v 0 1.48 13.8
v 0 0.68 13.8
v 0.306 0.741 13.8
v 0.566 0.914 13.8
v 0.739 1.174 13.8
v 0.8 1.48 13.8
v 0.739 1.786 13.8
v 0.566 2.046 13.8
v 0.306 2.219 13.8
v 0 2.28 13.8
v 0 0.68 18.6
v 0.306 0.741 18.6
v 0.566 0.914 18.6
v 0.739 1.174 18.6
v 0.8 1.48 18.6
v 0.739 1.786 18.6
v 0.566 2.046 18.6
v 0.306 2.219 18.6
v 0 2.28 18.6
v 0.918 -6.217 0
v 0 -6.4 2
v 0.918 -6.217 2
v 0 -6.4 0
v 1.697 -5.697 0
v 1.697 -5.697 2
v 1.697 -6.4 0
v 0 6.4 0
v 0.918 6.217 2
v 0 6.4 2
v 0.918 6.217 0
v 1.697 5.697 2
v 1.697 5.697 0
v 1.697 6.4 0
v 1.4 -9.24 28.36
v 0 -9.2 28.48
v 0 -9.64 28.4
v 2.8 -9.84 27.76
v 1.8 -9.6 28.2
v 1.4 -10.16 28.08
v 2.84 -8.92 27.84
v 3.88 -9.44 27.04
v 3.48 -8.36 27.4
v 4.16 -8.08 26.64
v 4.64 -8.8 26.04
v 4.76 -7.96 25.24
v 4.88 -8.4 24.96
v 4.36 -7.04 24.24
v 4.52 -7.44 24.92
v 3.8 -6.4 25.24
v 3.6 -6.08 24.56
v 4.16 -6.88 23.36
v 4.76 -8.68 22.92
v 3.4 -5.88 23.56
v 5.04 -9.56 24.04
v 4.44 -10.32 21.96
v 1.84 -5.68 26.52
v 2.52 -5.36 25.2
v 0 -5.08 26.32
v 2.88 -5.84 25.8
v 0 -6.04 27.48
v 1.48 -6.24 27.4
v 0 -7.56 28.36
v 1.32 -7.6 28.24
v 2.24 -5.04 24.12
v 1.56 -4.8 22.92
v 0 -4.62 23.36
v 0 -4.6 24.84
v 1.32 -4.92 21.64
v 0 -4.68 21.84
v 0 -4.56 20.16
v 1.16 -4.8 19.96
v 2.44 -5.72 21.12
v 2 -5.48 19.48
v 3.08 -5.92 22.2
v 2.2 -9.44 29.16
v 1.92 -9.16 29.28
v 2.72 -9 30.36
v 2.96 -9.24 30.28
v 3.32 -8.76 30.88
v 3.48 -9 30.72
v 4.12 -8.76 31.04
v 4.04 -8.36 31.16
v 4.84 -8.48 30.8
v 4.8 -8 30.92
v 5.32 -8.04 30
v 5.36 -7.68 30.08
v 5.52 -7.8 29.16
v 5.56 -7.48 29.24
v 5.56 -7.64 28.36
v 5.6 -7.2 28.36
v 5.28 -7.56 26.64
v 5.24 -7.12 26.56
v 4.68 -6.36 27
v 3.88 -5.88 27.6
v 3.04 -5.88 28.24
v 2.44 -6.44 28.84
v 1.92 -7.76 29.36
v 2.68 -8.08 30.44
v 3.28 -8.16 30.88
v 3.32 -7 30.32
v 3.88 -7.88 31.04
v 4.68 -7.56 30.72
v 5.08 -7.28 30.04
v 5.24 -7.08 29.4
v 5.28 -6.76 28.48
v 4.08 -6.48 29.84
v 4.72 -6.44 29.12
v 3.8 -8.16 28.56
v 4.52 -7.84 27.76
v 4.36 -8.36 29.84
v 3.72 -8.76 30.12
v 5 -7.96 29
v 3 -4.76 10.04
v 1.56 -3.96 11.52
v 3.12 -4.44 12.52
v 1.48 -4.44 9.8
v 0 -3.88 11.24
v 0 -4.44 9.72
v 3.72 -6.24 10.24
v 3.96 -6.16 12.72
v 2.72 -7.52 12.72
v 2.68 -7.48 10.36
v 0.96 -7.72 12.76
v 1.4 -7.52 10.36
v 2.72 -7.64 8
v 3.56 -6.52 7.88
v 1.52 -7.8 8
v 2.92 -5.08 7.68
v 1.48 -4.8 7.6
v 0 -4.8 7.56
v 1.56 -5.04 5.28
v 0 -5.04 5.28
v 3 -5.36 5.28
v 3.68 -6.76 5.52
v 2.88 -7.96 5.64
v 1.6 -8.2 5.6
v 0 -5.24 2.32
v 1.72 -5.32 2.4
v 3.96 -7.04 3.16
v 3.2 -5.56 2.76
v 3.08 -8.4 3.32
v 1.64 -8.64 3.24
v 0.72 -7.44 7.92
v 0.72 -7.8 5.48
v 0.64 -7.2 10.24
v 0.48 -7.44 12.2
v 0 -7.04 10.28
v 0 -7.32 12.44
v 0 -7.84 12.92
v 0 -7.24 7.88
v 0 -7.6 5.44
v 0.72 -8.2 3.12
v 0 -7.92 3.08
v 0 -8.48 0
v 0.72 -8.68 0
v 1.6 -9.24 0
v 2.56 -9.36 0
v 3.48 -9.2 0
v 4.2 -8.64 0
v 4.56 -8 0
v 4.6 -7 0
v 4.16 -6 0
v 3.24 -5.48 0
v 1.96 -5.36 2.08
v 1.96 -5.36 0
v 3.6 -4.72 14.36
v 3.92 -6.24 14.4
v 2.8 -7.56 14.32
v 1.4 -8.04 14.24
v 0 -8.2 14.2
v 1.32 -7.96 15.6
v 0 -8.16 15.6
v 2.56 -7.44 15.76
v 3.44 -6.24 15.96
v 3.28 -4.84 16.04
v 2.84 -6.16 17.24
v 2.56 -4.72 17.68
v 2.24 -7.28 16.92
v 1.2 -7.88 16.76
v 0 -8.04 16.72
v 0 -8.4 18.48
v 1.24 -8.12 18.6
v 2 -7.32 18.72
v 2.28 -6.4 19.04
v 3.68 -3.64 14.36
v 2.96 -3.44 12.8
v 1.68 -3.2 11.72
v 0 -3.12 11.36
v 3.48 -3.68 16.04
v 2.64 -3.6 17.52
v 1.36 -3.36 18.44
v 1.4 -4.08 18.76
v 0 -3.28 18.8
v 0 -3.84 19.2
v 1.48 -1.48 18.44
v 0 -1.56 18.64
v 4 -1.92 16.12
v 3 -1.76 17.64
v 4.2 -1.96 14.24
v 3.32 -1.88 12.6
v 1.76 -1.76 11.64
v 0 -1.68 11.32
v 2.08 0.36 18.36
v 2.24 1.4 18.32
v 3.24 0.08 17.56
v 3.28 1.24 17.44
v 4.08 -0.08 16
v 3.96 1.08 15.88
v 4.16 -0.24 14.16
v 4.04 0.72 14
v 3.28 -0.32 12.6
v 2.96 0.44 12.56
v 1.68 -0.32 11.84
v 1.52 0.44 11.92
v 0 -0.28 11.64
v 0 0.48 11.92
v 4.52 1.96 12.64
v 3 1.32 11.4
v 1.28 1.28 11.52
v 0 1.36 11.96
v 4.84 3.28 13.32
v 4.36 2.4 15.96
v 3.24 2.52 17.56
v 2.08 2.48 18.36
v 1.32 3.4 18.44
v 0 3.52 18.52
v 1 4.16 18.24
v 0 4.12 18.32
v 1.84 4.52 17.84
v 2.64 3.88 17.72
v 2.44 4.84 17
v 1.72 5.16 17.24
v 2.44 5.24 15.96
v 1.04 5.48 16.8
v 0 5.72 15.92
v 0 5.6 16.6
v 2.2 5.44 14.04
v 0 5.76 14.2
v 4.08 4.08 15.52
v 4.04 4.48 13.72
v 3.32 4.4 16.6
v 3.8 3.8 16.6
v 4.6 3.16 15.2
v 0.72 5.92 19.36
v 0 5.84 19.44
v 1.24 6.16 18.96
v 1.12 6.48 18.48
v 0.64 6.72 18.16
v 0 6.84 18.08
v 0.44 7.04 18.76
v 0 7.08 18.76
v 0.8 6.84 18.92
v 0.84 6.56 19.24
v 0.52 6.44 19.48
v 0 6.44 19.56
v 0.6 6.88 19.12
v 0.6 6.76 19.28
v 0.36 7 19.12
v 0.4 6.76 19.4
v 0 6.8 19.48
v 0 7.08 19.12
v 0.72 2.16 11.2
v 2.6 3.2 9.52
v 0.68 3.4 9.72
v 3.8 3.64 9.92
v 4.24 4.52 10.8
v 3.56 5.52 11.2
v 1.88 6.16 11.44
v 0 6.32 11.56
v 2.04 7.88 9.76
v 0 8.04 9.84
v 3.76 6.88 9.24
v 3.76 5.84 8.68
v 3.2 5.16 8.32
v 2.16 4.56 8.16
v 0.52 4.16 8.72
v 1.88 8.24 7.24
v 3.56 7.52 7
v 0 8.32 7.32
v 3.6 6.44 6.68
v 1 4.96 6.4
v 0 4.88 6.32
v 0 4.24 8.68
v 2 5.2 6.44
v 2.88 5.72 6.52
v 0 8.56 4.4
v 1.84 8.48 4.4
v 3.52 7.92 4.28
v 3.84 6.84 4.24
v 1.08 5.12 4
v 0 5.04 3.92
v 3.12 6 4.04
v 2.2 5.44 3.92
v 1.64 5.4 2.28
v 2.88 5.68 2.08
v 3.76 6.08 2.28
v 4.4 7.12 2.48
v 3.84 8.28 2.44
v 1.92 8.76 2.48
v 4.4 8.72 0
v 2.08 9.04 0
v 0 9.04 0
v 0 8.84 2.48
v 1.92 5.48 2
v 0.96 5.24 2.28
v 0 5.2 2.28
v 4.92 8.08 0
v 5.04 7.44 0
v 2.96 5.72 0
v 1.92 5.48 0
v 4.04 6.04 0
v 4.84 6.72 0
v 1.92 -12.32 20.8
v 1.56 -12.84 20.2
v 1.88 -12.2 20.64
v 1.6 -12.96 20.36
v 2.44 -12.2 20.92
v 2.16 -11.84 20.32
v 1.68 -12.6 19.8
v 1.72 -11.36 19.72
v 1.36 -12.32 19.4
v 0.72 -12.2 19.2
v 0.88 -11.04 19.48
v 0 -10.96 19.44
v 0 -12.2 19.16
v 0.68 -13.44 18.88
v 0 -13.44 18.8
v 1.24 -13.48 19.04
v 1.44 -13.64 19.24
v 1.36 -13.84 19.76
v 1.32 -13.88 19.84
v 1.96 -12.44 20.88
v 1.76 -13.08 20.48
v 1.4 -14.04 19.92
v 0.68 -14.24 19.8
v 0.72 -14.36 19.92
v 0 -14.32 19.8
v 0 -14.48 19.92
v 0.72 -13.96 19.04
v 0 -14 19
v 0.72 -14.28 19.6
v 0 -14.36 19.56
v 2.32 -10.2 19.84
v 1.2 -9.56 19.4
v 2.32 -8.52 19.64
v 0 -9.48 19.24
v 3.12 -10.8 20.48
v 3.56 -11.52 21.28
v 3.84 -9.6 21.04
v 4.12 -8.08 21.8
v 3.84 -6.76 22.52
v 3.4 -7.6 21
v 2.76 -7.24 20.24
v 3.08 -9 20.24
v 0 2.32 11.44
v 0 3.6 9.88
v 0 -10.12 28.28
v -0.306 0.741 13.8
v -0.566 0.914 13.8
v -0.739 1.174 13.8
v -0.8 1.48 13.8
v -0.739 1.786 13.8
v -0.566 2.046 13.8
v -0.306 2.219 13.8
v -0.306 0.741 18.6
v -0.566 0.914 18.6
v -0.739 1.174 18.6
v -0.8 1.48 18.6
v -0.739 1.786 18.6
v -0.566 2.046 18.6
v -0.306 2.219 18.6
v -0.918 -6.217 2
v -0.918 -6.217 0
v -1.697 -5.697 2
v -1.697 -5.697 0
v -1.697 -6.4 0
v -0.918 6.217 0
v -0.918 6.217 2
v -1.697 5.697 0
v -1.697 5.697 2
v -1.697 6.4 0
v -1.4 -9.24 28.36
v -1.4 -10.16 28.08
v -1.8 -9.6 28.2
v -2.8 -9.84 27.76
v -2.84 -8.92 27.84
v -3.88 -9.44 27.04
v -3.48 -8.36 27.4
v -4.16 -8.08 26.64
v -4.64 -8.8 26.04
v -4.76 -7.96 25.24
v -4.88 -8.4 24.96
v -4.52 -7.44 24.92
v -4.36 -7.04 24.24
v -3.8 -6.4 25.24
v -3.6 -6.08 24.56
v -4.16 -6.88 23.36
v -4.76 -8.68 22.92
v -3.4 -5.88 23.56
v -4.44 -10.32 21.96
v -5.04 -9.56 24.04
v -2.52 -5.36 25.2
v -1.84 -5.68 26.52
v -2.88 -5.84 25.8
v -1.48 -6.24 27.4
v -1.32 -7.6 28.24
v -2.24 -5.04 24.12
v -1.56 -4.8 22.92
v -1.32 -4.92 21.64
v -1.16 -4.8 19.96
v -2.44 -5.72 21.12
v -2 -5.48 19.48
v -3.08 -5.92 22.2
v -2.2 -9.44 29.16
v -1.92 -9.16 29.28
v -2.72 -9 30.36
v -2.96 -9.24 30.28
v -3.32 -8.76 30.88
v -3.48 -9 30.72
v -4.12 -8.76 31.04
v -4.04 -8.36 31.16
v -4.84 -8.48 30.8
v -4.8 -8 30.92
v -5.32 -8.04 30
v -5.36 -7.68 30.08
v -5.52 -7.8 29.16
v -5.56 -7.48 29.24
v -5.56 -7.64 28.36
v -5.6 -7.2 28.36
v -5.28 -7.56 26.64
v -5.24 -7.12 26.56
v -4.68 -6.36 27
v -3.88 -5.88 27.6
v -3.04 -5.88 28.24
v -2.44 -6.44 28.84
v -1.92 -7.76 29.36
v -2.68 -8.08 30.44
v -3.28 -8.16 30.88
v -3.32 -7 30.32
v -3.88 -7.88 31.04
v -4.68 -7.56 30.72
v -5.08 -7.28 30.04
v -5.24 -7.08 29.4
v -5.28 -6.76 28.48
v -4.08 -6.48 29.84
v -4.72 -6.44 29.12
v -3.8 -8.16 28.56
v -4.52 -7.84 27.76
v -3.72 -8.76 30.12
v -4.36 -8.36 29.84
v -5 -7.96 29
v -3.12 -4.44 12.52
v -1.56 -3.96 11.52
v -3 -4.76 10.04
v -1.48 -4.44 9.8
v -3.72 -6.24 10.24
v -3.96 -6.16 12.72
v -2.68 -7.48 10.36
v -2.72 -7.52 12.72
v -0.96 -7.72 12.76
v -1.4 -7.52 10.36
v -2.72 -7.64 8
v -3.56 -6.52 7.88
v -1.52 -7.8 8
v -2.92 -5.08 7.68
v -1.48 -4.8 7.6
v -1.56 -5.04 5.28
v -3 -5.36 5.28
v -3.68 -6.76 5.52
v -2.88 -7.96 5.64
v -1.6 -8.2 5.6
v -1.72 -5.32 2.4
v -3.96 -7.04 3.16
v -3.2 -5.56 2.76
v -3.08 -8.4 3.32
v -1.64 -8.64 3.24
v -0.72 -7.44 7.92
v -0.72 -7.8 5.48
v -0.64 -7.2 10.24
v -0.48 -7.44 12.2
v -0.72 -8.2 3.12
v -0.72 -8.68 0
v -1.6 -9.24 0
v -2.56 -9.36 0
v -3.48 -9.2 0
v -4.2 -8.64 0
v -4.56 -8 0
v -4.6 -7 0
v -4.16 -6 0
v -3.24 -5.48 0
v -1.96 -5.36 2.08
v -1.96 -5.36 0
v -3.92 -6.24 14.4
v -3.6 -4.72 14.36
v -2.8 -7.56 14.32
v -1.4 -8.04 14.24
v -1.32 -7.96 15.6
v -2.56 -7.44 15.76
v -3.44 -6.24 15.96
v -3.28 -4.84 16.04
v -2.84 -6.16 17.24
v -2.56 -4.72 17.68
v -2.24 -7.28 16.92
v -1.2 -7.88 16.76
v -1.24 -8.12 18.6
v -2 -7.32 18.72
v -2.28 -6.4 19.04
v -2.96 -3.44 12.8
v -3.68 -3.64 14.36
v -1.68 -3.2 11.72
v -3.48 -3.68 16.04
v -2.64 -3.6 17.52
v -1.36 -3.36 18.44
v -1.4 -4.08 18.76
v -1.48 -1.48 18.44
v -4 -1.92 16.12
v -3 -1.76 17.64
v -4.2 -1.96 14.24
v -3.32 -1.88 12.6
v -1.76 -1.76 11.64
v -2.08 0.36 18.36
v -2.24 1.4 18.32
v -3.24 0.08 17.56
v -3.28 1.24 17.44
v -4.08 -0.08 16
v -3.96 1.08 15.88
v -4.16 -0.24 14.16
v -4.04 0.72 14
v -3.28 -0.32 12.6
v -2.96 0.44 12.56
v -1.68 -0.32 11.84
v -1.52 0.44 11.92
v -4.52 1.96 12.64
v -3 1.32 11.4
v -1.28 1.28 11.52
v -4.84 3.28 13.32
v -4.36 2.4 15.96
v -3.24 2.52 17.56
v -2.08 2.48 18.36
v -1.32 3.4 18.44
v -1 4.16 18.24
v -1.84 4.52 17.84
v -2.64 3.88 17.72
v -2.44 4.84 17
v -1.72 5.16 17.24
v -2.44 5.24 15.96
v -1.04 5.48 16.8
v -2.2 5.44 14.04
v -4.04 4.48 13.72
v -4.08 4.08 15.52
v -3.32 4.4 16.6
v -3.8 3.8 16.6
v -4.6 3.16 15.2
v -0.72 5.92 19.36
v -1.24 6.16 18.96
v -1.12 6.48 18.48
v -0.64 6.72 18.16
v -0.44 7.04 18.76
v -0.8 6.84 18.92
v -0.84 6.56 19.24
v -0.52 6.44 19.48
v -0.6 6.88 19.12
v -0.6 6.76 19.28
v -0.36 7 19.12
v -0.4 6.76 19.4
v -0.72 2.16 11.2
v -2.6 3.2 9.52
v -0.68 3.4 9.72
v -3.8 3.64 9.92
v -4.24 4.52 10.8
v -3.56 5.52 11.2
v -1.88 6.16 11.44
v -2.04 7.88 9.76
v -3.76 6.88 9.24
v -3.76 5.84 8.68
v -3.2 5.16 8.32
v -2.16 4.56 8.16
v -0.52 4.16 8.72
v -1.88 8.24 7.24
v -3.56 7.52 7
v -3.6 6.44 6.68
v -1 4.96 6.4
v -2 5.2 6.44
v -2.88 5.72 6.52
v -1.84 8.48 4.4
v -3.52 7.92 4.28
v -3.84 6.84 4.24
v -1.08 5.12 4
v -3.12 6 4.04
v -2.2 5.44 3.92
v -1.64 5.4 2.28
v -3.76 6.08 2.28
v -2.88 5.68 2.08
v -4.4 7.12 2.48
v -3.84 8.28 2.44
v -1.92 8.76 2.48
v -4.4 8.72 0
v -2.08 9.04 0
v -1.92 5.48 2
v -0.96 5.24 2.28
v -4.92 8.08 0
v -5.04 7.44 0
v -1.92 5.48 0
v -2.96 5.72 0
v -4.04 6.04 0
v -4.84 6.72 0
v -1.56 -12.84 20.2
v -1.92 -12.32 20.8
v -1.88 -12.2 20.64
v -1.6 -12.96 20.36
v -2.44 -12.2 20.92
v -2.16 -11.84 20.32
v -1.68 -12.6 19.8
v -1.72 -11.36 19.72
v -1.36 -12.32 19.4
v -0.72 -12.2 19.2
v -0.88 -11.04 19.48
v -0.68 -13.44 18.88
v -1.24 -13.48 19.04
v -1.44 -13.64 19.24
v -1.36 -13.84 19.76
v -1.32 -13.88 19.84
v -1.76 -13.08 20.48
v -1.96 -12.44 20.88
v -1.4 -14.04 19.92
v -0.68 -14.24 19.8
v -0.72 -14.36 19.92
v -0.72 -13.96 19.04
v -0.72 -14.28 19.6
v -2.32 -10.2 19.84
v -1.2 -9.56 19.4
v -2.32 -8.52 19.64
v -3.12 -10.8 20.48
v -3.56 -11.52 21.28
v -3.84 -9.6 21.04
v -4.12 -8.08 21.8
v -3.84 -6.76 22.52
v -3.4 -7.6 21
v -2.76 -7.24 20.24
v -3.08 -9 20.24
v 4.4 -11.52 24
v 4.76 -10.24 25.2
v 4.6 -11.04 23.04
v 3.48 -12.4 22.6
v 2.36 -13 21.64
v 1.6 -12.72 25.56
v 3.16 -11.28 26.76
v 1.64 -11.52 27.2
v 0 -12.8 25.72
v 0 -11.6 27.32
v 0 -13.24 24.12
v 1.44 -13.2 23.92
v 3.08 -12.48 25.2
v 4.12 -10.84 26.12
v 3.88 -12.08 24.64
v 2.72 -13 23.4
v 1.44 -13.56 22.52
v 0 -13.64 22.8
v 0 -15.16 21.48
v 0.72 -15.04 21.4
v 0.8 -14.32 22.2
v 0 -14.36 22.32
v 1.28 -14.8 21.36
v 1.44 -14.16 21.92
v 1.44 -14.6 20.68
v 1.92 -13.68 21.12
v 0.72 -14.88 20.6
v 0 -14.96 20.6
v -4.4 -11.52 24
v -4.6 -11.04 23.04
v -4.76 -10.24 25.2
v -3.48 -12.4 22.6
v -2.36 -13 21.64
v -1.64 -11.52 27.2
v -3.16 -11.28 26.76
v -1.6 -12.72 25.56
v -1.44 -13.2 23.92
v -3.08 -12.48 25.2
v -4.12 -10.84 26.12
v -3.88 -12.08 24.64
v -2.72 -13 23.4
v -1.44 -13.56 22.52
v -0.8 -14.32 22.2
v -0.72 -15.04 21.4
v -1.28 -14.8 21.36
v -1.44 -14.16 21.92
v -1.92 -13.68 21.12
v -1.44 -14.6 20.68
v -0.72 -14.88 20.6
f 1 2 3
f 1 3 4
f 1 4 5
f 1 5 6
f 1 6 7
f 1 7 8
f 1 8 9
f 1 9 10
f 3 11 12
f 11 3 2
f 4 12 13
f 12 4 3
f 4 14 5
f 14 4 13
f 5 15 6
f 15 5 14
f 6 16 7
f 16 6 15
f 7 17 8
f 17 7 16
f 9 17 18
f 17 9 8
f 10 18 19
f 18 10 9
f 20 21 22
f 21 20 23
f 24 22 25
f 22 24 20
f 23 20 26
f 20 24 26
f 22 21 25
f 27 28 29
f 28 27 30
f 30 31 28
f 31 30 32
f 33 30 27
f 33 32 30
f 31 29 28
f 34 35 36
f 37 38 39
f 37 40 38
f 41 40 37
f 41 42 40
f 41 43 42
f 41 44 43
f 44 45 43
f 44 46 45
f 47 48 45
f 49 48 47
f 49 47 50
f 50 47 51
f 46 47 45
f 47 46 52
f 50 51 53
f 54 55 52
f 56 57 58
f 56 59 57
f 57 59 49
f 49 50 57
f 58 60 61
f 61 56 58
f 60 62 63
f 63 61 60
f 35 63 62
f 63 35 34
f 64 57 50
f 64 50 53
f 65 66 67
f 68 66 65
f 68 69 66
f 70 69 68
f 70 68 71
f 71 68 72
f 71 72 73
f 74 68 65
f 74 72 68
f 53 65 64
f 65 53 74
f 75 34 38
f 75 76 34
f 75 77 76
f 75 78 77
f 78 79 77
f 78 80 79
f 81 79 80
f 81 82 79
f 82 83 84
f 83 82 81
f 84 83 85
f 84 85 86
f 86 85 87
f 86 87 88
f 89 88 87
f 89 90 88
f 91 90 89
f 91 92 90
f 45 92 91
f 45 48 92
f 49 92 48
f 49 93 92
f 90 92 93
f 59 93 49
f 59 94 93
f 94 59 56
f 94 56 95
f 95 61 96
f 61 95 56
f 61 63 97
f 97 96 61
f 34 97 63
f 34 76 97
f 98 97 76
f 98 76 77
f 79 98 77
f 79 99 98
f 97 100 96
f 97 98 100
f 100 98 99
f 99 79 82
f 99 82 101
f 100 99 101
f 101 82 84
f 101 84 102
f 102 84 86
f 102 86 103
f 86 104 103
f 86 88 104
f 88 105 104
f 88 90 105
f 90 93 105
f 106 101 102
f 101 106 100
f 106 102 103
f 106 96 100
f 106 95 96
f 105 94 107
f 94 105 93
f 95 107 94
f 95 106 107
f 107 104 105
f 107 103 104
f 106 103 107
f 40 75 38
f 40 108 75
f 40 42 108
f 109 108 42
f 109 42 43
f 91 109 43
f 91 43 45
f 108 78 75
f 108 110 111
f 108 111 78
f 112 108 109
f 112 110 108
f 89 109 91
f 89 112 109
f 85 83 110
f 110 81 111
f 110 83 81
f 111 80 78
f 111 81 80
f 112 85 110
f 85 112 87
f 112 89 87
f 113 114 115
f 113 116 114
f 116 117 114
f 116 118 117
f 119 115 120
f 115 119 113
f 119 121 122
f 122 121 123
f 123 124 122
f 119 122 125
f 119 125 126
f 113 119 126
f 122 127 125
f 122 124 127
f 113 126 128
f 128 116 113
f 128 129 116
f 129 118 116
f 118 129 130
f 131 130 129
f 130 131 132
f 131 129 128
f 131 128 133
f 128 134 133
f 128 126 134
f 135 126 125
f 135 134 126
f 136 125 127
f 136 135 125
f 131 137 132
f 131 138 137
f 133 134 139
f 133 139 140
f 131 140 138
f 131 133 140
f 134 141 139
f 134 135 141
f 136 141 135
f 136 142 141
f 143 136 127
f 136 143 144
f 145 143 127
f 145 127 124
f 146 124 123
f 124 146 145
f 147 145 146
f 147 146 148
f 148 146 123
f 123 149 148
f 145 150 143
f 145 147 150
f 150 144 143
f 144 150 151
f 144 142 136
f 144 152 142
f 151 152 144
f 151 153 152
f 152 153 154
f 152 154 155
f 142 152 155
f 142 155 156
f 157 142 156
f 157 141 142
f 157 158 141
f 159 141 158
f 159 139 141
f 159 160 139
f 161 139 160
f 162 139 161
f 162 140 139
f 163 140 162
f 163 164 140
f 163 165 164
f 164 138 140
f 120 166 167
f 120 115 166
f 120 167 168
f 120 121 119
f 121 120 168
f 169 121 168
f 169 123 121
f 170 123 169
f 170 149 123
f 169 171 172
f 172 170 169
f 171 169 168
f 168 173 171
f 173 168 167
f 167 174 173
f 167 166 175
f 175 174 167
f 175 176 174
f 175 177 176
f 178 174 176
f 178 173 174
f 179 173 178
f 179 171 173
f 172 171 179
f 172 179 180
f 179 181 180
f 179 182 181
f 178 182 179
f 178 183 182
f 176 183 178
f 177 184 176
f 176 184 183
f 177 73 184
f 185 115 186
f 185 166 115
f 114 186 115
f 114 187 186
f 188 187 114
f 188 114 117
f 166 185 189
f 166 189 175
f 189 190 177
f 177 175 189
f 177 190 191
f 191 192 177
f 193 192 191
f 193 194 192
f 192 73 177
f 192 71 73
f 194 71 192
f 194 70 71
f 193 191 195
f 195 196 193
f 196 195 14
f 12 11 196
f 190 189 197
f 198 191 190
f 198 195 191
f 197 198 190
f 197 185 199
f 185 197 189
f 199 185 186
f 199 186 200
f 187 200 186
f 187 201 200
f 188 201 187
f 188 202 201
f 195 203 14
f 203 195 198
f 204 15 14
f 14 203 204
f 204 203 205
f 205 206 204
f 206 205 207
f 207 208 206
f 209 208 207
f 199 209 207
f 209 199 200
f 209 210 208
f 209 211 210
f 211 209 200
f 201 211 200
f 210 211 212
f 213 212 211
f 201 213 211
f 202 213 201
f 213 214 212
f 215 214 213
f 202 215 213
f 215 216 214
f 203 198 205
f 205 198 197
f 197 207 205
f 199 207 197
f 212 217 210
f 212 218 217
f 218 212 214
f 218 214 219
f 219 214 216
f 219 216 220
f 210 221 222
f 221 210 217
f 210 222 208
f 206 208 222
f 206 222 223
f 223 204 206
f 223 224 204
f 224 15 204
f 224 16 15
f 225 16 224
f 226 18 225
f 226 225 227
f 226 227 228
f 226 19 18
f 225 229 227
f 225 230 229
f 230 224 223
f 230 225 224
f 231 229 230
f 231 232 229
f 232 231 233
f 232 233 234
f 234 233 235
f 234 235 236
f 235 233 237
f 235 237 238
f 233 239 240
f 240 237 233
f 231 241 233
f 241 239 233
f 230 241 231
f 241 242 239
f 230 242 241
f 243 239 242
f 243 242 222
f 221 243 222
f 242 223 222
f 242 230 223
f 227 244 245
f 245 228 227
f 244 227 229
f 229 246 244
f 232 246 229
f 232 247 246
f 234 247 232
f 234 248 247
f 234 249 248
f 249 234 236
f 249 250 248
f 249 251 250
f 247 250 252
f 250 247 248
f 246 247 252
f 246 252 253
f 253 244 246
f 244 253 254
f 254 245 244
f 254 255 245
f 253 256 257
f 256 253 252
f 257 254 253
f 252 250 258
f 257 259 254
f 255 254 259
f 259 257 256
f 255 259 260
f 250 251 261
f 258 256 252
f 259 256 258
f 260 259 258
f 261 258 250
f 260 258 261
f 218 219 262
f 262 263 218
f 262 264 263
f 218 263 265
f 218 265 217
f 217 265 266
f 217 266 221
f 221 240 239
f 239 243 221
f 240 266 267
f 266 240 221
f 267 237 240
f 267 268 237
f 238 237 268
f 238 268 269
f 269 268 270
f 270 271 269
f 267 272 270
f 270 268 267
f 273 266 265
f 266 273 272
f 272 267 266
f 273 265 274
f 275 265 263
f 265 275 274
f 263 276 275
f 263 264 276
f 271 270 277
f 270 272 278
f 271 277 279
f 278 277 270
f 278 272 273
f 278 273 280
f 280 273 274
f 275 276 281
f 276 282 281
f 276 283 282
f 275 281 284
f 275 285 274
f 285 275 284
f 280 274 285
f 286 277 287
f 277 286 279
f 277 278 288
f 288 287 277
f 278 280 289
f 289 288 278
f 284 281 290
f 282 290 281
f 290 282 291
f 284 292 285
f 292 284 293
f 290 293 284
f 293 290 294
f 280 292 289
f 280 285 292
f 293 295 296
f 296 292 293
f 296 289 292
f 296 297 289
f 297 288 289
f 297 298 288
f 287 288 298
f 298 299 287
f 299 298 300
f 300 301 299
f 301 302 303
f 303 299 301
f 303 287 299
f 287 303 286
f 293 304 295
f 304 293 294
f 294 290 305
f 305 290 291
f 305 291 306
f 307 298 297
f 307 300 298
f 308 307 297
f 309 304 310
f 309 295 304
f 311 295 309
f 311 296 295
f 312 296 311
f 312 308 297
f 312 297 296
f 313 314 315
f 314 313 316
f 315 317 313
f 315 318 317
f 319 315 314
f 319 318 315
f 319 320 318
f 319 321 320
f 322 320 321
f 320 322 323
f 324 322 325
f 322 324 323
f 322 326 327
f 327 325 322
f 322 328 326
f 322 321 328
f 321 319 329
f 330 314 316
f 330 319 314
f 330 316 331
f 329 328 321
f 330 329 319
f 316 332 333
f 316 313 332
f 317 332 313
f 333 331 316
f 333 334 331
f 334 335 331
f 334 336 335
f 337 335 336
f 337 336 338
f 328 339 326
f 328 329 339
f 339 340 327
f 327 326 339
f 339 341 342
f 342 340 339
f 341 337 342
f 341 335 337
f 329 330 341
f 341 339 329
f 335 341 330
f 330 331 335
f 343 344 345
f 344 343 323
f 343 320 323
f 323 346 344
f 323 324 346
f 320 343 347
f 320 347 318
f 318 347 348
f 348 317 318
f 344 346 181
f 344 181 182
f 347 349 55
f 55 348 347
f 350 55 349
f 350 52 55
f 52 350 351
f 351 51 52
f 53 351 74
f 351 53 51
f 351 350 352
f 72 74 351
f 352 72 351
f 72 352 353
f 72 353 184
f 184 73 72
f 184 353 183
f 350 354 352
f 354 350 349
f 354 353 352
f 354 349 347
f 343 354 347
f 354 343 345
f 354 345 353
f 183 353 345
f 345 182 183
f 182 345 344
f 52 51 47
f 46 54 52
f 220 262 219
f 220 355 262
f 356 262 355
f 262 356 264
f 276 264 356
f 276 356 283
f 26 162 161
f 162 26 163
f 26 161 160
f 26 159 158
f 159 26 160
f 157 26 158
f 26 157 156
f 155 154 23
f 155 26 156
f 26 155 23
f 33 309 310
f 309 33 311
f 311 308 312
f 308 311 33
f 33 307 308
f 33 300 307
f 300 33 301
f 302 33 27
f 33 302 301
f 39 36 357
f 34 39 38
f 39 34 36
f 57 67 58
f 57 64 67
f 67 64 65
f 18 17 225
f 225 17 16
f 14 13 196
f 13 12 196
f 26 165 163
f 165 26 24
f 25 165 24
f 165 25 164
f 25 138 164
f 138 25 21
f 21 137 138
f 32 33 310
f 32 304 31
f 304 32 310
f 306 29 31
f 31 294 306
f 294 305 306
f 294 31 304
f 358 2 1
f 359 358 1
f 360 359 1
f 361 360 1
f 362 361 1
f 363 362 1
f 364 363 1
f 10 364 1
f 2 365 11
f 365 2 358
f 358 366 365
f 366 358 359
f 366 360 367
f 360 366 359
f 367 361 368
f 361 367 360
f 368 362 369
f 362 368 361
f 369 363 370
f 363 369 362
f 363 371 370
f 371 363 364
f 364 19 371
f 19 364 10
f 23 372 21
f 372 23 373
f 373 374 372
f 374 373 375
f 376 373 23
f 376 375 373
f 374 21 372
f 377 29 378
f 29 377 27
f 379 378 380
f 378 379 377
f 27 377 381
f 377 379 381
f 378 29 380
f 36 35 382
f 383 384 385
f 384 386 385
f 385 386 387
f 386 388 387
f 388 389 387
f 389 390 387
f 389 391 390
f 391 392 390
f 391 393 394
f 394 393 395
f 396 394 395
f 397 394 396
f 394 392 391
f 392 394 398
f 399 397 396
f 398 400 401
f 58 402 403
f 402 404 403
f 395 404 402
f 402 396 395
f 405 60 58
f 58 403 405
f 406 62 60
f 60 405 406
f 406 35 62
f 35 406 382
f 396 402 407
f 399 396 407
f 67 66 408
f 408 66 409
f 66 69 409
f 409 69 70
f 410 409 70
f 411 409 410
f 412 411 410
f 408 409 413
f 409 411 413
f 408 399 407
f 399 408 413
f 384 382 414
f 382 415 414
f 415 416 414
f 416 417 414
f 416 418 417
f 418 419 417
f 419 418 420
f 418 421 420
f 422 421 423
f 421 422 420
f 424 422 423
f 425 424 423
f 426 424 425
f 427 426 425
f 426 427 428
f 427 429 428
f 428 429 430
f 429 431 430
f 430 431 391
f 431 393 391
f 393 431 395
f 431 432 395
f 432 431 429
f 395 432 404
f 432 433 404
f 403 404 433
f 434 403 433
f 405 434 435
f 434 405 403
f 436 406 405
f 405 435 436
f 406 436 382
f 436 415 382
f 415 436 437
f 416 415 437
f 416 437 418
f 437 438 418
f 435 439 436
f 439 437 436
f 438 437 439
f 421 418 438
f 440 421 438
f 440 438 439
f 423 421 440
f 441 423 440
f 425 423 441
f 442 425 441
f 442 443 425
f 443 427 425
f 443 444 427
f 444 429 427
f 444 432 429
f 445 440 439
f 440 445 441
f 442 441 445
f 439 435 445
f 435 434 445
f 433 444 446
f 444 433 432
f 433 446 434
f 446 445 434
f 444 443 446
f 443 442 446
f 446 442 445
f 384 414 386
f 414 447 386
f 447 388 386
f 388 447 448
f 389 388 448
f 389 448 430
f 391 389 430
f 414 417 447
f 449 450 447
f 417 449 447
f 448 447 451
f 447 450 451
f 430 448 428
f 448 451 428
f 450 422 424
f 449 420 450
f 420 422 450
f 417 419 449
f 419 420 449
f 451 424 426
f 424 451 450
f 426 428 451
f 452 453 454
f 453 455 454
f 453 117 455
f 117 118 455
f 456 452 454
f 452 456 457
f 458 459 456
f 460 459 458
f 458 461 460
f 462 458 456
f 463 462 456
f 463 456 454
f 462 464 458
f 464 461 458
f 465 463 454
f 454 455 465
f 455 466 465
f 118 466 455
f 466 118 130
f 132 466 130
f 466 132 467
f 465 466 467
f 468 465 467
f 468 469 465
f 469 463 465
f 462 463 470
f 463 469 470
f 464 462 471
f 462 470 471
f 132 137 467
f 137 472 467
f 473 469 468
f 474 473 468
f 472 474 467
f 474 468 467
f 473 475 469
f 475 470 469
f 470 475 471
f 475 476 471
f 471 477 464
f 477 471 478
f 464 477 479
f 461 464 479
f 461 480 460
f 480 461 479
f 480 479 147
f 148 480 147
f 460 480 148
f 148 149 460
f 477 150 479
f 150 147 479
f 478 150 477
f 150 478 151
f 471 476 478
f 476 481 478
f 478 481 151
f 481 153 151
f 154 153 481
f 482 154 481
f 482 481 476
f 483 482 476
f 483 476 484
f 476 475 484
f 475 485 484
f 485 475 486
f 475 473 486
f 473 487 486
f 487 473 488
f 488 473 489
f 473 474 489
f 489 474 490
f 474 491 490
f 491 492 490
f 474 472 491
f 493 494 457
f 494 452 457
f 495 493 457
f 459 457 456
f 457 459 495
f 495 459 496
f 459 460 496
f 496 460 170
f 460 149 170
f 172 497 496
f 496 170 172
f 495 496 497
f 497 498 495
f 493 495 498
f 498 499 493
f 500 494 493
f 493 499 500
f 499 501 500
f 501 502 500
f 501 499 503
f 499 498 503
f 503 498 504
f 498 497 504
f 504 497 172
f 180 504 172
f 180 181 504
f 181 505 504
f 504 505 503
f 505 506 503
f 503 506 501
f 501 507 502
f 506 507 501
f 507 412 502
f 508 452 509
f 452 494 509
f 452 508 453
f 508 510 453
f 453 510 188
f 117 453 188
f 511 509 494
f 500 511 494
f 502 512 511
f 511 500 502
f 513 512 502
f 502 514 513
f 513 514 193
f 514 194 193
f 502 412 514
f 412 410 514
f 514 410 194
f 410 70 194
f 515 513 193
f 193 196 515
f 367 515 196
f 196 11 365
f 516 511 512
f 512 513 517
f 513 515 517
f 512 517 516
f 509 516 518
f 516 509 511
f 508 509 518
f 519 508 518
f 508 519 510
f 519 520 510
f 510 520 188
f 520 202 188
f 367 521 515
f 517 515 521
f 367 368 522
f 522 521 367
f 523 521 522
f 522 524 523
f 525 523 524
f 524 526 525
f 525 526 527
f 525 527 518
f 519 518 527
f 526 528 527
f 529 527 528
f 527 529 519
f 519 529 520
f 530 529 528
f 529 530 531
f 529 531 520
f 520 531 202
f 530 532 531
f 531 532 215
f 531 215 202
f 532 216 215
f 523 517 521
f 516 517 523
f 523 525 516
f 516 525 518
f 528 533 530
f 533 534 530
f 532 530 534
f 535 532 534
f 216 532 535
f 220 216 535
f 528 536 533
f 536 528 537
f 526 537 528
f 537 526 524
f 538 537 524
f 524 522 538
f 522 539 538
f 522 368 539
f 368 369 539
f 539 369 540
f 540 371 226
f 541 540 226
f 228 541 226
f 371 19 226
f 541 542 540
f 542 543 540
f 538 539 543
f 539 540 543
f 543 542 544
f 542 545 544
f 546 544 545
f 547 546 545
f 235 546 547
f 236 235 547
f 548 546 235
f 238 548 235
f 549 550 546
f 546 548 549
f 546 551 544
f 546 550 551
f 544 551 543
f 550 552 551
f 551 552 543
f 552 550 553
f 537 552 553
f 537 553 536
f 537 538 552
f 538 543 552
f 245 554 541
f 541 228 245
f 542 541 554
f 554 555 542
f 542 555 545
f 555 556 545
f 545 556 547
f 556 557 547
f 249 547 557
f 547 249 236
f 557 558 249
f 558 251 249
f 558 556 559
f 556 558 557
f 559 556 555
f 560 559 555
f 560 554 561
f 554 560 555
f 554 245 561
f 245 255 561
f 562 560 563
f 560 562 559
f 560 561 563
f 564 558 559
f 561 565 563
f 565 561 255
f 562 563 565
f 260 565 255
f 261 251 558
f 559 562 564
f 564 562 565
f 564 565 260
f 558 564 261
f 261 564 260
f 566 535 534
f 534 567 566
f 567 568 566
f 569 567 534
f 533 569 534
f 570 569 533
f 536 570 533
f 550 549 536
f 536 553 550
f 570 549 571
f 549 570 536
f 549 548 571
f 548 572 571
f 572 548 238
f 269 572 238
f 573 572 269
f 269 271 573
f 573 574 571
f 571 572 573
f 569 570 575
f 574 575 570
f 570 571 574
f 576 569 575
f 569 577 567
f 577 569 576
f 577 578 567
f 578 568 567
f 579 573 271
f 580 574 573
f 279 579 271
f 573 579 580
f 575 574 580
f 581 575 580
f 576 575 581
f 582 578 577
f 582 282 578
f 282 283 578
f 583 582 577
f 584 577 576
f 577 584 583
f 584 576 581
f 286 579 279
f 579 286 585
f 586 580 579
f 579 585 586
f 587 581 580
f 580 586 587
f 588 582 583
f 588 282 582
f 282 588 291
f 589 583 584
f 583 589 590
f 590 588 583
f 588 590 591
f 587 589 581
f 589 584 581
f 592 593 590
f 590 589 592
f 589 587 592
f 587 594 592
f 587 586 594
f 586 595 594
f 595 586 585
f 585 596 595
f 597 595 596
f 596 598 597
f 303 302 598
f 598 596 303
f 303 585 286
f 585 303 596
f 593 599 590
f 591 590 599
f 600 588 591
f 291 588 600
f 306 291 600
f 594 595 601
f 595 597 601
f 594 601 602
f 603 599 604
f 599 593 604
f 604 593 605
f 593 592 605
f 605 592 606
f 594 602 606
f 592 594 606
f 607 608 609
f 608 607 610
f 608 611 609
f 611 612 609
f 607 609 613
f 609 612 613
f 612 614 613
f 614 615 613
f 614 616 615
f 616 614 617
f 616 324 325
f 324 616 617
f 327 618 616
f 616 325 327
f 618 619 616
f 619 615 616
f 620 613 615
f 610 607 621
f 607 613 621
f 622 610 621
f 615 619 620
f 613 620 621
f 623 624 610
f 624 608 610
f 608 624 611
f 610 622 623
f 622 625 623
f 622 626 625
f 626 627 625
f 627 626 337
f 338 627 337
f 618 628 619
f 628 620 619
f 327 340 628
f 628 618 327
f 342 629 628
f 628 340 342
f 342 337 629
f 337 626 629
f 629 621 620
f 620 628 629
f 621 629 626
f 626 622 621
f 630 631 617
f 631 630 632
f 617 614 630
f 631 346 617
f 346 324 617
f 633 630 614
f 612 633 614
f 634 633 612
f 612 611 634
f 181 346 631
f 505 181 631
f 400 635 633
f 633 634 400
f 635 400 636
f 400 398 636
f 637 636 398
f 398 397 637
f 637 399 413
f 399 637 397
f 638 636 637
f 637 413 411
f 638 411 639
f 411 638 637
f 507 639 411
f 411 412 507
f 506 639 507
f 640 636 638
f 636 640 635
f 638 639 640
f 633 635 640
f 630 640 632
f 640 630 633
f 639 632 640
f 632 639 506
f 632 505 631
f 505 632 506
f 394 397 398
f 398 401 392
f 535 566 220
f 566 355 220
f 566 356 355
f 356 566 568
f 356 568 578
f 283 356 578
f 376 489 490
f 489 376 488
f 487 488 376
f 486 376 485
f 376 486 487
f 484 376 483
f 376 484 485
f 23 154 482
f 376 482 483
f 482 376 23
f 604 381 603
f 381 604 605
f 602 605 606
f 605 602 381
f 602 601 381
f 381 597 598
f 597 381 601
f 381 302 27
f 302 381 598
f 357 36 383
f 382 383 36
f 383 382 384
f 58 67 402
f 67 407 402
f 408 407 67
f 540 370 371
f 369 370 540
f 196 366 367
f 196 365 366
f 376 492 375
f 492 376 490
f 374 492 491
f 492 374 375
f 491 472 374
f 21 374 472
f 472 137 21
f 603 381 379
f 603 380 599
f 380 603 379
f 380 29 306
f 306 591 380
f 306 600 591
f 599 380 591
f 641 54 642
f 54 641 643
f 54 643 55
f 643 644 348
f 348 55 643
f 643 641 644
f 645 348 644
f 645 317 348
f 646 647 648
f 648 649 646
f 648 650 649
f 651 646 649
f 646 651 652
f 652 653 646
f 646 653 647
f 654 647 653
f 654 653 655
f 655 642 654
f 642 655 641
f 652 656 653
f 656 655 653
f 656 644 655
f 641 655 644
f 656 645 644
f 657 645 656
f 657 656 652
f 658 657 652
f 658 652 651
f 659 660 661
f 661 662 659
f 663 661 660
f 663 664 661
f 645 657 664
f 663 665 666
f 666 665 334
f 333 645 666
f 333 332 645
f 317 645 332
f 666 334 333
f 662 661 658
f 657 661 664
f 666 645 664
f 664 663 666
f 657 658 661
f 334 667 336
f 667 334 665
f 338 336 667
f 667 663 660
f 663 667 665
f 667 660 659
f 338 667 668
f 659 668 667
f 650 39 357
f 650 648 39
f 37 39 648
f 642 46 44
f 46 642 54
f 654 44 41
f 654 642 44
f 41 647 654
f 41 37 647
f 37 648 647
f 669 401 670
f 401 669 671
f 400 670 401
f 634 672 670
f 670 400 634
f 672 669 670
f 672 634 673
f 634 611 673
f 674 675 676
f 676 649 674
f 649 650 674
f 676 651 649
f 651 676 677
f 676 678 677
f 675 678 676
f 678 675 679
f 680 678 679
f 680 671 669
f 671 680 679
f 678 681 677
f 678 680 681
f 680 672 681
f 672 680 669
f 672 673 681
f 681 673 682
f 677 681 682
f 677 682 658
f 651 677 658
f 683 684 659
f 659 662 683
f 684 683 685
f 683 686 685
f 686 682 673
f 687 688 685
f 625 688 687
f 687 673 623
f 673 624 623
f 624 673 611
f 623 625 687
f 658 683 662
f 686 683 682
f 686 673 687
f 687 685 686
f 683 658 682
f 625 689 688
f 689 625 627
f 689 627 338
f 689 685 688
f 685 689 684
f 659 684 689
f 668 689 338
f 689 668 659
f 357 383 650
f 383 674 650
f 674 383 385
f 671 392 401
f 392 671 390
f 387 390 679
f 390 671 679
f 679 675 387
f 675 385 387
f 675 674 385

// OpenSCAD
use <../lib.scad>
use <s/13393s00.scad>
use <s/13393s02.scad>
function ldraw_lib__13393() = [
// 0 Animal Fawn Friends
// 0 Name: 13393.dat
// 0 Author: Philippe Hurbain [Philo]
// 0 !LDRAW_ORG Part UPDATE 2025-07
// 0 !LICENSE Licensed under CC BY 4.0 : see CAreadme.txt
// 
// 0 !HELP Accessory hole: Y=-46.5, z=3.7
// 
// 0 BFC CERTIFY CCW
  [0,"BFC","CERTIFY"],
  [0,"BFC","CCW"],
// 
// 0 !KEYWORDS Deer
// 
// 0 !HISTORY 2025-05-06 {LEGO Instructions App} Original part shape
// 0 !HISTORY 2025-05-06 [Philo] File preparation for LDraw Parts Tracker
// 0 !HISTORY 2025-07-27 [OrionP] Official Update 2025-07
// 
// 1 16 0 0 0 1 0 0 0 1 0 0 0 1 s\13393s00.dat
  [1,16,0,0,0,1,0,0,0,1,0,0,0,1, ldraw_lib__s__13393s00()],
// 1 16 0 0 0 1 0 0 0 1 0 0 0 1 s\13393s02.dat
  [1,16,0,0,0,1,0,0,0,1,0,0,0,1, ldraw_lib__s__13393s02()],
// 1 16 0 0 0 -1 0 0 0 1 0 0 0 1 s\13393s02.dat
  [1,16,0,0,0,-1,0,0,0,1,0,0,0,1, ldraw_lib__s__13393s02()],
];
module ldraw_lib__13393(step=0, col=false, unit=2/5, alt=false, line=0.2, solid=!$preview)
    makepoly(ldraw_lib__13393(), step=step, col=col, unit=unit, alt=alt, line=line, solid=solid);
ldraw_lib__13393(line=0.2);
